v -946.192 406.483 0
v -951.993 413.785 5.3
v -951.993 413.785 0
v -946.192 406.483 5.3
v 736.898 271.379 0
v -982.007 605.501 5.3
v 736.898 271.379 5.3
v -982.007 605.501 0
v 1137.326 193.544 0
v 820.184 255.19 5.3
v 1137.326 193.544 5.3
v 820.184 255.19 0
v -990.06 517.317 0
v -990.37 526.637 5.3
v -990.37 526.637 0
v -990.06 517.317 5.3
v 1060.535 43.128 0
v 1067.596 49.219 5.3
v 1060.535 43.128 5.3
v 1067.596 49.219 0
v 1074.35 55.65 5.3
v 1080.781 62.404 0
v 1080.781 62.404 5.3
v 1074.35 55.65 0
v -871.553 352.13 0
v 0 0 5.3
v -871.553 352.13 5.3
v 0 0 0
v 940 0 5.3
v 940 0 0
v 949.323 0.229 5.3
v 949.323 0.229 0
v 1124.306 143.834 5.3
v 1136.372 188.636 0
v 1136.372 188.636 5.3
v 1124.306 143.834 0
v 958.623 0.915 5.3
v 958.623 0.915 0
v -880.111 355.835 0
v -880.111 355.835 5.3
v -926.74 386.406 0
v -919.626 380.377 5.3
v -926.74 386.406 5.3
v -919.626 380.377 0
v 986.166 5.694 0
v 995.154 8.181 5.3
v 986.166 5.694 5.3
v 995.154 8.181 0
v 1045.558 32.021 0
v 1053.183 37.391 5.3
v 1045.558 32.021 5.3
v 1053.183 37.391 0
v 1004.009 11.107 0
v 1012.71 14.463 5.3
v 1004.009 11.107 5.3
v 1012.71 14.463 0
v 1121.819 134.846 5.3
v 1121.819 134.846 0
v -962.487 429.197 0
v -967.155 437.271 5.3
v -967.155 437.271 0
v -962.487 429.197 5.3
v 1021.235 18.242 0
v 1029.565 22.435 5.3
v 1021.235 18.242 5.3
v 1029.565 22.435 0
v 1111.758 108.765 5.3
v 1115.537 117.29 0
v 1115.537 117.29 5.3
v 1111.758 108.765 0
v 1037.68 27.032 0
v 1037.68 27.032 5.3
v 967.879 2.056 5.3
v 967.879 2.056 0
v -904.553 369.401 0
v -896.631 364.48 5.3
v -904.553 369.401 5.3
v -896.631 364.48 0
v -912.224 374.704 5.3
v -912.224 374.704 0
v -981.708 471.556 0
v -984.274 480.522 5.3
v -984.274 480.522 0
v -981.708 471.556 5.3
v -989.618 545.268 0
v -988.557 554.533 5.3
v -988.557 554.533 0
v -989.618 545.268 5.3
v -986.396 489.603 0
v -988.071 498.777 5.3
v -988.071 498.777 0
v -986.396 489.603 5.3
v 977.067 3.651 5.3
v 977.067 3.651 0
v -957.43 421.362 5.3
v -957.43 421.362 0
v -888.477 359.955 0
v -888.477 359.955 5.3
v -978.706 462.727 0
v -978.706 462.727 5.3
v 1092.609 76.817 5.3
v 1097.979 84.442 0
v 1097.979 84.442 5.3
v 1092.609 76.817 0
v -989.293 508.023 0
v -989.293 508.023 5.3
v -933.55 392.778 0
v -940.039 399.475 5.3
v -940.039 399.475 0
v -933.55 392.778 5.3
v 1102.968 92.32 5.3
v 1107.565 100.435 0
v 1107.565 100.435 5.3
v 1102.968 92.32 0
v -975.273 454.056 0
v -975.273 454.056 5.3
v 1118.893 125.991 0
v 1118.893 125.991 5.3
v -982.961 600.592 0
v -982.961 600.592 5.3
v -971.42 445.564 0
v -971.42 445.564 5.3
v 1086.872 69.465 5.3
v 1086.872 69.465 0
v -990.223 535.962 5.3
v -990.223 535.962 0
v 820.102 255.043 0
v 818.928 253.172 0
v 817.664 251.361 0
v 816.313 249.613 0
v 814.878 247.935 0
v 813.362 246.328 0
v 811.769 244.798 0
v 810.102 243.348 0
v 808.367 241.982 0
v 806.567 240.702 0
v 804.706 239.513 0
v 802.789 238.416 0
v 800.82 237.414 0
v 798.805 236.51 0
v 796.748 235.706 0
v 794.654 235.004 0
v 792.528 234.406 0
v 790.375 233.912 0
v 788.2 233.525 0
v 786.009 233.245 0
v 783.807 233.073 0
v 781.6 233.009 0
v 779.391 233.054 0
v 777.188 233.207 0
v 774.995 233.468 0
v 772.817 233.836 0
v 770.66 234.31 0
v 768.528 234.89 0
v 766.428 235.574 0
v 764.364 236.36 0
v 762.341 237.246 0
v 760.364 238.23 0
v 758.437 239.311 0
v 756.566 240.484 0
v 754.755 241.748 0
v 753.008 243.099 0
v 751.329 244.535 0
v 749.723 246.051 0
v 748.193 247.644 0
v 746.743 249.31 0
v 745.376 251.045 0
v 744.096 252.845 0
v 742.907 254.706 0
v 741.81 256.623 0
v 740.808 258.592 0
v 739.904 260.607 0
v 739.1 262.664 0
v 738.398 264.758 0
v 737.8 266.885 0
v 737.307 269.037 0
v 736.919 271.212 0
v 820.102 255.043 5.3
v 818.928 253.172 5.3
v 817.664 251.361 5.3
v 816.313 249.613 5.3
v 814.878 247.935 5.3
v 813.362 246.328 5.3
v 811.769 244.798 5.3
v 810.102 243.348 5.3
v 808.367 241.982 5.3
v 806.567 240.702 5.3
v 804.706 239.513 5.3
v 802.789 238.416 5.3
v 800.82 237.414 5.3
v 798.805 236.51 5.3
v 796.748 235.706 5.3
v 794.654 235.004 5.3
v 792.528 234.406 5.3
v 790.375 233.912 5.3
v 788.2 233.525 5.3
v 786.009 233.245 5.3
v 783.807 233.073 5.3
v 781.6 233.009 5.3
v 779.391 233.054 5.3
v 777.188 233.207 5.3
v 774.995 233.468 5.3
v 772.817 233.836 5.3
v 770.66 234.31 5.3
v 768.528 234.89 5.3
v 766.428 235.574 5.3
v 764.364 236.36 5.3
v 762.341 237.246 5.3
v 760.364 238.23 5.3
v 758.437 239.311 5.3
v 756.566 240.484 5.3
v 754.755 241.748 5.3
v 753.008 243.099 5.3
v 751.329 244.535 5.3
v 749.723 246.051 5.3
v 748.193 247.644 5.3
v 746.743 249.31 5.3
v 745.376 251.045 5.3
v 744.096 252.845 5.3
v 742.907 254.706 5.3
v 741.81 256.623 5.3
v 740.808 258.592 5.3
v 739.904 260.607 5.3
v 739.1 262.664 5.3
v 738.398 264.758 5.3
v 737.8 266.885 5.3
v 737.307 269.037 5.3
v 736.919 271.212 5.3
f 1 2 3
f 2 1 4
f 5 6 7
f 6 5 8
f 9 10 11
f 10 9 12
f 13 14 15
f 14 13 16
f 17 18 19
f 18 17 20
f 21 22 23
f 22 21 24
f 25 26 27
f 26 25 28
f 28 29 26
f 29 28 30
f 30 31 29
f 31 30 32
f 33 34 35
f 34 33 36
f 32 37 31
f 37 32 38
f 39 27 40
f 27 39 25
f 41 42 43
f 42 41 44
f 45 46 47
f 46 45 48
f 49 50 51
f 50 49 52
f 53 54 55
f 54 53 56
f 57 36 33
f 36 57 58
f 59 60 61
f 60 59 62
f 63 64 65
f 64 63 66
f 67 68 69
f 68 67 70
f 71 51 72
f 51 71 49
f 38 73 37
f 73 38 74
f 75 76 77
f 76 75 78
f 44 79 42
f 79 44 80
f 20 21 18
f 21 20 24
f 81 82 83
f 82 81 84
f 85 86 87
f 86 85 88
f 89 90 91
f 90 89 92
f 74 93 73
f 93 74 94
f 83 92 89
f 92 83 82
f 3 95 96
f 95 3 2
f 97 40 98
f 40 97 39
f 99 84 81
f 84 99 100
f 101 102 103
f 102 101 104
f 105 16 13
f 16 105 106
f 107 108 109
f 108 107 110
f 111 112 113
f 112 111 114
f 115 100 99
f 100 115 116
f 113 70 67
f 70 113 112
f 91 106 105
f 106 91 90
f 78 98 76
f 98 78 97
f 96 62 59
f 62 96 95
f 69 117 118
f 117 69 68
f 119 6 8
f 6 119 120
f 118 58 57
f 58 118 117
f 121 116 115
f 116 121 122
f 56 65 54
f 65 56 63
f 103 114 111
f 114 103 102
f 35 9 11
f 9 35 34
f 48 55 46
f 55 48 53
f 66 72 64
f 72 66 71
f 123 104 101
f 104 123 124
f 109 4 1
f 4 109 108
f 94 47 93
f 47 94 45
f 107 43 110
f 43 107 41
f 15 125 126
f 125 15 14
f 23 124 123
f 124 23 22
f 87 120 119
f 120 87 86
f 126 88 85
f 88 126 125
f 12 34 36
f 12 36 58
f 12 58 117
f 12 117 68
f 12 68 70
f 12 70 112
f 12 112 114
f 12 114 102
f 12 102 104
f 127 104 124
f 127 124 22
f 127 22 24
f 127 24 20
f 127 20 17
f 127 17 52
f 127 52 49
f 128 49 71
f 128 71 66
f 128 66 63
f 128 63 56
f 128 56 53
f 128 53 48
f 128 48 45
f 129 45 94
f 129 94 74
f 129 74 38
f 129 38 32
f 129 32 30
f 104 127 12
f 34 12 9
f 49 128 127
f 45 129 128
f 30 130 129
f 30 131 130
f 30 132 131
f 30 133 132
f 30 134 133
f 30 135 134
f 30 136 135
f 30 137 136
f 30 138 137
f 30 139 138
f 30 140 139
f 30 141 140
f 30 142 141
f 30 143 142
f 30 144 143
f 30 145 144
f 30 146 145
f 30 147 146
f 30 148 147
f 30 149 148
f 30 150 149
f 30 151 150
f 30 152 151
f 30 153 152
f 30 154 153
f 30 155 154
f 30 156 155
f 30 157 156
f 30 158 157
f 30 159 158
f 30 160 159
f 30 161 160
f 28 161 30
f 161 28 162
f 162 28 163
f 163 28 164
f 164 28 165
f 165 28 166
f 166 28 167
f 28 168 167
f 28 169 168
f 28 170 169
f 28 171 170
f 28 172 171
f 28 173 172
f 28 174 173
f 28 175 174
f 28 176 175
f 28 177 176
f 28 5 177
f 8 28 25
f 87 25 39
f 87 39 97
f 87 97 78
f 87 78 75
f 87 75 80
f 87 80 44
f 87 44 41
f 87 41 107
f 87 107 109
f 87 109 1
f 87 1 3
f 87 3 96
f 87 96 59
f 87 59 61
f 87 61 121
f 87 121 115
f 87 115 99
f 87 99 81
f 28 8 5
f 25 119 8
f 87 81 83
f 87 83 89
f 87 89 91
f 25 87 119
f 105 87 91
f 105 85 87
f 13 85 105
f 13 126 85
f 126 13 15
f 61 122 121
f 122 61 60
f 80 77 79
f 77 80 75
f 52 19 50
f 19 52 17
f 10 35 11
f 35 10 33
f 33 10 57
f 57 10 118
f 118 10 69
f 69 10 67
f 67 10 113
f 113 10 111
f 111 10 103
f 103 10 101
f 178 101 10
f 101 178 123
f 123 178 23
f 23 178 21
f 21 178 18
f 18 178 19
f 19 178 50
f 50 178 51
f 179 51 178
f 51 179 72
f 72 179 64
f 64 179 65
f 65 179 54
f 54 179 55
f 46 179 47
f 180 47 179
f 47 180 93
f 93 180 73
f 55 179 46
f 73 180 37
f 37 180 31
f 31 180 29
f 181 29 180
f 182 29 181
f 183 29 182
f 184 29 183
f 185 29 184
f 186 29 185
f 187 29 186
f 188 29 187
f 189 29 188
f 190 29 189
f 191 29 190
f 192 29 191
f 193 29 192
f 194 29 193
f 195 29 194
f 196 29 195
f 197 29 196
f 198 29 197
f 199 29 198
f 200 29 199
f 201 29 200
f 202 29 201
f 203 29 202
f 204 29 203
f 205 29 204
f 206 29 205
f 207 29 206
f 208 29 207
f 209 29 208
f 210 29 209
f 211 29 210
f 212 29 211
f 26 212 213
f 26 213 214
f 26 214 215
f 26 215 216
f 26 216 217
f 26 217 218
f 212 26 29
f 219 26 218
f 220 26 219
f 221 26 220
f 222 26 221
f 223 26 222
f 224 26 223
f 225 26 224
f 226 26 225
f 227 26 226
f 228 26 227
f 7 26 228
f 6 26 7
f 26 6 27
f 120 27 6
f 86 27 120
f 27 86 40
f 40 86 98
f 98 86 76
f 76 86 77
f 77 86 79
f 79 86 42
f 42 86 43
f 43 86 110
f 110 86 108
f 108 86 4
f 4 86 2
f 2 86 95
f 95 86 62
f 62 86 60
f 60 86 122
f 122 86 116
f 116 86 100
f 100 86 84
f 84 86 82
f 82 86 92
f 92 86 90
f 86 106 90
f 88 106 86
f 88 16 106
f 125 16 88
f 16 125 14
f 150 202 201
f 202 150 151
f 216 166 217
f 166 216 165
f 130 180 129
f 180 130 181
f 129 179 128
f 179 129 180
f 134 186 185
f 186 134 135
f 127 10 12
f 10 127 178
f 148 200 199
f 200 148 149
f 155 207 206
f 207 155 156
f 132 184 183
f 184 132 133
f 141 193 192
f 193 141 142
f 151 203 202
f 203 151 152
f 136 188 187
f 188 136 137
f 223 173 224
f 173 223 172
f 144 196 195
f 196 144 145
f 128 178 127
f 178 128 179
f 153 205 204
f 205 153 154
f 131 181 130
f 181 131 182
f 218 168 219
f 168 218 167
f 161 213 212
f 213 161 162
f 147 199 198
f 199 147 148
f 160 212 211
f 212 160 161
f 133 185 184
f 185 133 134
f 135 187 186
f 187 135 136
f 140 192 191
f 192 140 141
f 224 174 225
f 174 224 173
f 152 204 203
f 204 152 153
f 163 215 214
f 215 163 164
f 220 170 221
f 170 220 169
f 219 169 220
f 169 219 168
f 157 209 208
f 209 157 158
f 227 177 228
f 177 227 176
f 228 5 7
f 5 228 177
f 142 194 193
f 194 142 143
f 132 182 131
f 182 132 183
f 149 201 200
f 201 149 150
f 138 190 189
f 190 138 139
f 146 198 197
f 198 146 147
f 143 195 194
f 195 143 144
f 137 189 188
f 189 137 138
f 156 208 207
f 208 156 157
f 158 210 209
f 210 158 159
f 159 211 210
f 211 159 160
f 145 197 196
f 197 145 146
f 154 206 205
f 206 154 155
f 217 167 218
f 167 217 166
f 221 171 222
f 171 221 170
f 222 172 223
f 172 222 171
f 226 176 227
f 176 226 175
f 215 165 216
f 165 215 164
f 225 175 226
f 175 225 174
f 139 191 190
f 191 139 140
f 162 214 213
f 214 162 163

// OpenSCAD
$fn = 128;
// $fn = 64;
//$fn = 32;
//$fn = 16;

thickness = 5.3; // Thickness of the plywood
centerAngle = 22;
outerRadius = 190;
frontEdgeLength = 940;


module sideShape() {
  cube([frontEdgeLength, 10, thickness]);
  translate([frontEdgeLength, outerRadius, 0])
    cylinder(h = thickness, r = outerRadius);
}


//projection()
difference() {
  hull()
  intersection() {
    union() { 
      sideShape();
      mirror([1, 0, 0])
        rotate([0, 0, centerAngle])
          sideShape();
      rotate([0, 0, -centerAngle / 2])
        translate([-2159 / 2, 402, 0])
          cube([2159, 10, thickness]);
    }

    rotate([0, 0, -centerAngle / 2])
      translate([-1100, 0, 0])
        cube([2200, 407, thickness]);
  }
  rotate([0, 0, -centerAngle / 2])
    translate([714, 407 + 15, -0.1])
      cylinder(h = thickness + 0.2, d = 90);
}
